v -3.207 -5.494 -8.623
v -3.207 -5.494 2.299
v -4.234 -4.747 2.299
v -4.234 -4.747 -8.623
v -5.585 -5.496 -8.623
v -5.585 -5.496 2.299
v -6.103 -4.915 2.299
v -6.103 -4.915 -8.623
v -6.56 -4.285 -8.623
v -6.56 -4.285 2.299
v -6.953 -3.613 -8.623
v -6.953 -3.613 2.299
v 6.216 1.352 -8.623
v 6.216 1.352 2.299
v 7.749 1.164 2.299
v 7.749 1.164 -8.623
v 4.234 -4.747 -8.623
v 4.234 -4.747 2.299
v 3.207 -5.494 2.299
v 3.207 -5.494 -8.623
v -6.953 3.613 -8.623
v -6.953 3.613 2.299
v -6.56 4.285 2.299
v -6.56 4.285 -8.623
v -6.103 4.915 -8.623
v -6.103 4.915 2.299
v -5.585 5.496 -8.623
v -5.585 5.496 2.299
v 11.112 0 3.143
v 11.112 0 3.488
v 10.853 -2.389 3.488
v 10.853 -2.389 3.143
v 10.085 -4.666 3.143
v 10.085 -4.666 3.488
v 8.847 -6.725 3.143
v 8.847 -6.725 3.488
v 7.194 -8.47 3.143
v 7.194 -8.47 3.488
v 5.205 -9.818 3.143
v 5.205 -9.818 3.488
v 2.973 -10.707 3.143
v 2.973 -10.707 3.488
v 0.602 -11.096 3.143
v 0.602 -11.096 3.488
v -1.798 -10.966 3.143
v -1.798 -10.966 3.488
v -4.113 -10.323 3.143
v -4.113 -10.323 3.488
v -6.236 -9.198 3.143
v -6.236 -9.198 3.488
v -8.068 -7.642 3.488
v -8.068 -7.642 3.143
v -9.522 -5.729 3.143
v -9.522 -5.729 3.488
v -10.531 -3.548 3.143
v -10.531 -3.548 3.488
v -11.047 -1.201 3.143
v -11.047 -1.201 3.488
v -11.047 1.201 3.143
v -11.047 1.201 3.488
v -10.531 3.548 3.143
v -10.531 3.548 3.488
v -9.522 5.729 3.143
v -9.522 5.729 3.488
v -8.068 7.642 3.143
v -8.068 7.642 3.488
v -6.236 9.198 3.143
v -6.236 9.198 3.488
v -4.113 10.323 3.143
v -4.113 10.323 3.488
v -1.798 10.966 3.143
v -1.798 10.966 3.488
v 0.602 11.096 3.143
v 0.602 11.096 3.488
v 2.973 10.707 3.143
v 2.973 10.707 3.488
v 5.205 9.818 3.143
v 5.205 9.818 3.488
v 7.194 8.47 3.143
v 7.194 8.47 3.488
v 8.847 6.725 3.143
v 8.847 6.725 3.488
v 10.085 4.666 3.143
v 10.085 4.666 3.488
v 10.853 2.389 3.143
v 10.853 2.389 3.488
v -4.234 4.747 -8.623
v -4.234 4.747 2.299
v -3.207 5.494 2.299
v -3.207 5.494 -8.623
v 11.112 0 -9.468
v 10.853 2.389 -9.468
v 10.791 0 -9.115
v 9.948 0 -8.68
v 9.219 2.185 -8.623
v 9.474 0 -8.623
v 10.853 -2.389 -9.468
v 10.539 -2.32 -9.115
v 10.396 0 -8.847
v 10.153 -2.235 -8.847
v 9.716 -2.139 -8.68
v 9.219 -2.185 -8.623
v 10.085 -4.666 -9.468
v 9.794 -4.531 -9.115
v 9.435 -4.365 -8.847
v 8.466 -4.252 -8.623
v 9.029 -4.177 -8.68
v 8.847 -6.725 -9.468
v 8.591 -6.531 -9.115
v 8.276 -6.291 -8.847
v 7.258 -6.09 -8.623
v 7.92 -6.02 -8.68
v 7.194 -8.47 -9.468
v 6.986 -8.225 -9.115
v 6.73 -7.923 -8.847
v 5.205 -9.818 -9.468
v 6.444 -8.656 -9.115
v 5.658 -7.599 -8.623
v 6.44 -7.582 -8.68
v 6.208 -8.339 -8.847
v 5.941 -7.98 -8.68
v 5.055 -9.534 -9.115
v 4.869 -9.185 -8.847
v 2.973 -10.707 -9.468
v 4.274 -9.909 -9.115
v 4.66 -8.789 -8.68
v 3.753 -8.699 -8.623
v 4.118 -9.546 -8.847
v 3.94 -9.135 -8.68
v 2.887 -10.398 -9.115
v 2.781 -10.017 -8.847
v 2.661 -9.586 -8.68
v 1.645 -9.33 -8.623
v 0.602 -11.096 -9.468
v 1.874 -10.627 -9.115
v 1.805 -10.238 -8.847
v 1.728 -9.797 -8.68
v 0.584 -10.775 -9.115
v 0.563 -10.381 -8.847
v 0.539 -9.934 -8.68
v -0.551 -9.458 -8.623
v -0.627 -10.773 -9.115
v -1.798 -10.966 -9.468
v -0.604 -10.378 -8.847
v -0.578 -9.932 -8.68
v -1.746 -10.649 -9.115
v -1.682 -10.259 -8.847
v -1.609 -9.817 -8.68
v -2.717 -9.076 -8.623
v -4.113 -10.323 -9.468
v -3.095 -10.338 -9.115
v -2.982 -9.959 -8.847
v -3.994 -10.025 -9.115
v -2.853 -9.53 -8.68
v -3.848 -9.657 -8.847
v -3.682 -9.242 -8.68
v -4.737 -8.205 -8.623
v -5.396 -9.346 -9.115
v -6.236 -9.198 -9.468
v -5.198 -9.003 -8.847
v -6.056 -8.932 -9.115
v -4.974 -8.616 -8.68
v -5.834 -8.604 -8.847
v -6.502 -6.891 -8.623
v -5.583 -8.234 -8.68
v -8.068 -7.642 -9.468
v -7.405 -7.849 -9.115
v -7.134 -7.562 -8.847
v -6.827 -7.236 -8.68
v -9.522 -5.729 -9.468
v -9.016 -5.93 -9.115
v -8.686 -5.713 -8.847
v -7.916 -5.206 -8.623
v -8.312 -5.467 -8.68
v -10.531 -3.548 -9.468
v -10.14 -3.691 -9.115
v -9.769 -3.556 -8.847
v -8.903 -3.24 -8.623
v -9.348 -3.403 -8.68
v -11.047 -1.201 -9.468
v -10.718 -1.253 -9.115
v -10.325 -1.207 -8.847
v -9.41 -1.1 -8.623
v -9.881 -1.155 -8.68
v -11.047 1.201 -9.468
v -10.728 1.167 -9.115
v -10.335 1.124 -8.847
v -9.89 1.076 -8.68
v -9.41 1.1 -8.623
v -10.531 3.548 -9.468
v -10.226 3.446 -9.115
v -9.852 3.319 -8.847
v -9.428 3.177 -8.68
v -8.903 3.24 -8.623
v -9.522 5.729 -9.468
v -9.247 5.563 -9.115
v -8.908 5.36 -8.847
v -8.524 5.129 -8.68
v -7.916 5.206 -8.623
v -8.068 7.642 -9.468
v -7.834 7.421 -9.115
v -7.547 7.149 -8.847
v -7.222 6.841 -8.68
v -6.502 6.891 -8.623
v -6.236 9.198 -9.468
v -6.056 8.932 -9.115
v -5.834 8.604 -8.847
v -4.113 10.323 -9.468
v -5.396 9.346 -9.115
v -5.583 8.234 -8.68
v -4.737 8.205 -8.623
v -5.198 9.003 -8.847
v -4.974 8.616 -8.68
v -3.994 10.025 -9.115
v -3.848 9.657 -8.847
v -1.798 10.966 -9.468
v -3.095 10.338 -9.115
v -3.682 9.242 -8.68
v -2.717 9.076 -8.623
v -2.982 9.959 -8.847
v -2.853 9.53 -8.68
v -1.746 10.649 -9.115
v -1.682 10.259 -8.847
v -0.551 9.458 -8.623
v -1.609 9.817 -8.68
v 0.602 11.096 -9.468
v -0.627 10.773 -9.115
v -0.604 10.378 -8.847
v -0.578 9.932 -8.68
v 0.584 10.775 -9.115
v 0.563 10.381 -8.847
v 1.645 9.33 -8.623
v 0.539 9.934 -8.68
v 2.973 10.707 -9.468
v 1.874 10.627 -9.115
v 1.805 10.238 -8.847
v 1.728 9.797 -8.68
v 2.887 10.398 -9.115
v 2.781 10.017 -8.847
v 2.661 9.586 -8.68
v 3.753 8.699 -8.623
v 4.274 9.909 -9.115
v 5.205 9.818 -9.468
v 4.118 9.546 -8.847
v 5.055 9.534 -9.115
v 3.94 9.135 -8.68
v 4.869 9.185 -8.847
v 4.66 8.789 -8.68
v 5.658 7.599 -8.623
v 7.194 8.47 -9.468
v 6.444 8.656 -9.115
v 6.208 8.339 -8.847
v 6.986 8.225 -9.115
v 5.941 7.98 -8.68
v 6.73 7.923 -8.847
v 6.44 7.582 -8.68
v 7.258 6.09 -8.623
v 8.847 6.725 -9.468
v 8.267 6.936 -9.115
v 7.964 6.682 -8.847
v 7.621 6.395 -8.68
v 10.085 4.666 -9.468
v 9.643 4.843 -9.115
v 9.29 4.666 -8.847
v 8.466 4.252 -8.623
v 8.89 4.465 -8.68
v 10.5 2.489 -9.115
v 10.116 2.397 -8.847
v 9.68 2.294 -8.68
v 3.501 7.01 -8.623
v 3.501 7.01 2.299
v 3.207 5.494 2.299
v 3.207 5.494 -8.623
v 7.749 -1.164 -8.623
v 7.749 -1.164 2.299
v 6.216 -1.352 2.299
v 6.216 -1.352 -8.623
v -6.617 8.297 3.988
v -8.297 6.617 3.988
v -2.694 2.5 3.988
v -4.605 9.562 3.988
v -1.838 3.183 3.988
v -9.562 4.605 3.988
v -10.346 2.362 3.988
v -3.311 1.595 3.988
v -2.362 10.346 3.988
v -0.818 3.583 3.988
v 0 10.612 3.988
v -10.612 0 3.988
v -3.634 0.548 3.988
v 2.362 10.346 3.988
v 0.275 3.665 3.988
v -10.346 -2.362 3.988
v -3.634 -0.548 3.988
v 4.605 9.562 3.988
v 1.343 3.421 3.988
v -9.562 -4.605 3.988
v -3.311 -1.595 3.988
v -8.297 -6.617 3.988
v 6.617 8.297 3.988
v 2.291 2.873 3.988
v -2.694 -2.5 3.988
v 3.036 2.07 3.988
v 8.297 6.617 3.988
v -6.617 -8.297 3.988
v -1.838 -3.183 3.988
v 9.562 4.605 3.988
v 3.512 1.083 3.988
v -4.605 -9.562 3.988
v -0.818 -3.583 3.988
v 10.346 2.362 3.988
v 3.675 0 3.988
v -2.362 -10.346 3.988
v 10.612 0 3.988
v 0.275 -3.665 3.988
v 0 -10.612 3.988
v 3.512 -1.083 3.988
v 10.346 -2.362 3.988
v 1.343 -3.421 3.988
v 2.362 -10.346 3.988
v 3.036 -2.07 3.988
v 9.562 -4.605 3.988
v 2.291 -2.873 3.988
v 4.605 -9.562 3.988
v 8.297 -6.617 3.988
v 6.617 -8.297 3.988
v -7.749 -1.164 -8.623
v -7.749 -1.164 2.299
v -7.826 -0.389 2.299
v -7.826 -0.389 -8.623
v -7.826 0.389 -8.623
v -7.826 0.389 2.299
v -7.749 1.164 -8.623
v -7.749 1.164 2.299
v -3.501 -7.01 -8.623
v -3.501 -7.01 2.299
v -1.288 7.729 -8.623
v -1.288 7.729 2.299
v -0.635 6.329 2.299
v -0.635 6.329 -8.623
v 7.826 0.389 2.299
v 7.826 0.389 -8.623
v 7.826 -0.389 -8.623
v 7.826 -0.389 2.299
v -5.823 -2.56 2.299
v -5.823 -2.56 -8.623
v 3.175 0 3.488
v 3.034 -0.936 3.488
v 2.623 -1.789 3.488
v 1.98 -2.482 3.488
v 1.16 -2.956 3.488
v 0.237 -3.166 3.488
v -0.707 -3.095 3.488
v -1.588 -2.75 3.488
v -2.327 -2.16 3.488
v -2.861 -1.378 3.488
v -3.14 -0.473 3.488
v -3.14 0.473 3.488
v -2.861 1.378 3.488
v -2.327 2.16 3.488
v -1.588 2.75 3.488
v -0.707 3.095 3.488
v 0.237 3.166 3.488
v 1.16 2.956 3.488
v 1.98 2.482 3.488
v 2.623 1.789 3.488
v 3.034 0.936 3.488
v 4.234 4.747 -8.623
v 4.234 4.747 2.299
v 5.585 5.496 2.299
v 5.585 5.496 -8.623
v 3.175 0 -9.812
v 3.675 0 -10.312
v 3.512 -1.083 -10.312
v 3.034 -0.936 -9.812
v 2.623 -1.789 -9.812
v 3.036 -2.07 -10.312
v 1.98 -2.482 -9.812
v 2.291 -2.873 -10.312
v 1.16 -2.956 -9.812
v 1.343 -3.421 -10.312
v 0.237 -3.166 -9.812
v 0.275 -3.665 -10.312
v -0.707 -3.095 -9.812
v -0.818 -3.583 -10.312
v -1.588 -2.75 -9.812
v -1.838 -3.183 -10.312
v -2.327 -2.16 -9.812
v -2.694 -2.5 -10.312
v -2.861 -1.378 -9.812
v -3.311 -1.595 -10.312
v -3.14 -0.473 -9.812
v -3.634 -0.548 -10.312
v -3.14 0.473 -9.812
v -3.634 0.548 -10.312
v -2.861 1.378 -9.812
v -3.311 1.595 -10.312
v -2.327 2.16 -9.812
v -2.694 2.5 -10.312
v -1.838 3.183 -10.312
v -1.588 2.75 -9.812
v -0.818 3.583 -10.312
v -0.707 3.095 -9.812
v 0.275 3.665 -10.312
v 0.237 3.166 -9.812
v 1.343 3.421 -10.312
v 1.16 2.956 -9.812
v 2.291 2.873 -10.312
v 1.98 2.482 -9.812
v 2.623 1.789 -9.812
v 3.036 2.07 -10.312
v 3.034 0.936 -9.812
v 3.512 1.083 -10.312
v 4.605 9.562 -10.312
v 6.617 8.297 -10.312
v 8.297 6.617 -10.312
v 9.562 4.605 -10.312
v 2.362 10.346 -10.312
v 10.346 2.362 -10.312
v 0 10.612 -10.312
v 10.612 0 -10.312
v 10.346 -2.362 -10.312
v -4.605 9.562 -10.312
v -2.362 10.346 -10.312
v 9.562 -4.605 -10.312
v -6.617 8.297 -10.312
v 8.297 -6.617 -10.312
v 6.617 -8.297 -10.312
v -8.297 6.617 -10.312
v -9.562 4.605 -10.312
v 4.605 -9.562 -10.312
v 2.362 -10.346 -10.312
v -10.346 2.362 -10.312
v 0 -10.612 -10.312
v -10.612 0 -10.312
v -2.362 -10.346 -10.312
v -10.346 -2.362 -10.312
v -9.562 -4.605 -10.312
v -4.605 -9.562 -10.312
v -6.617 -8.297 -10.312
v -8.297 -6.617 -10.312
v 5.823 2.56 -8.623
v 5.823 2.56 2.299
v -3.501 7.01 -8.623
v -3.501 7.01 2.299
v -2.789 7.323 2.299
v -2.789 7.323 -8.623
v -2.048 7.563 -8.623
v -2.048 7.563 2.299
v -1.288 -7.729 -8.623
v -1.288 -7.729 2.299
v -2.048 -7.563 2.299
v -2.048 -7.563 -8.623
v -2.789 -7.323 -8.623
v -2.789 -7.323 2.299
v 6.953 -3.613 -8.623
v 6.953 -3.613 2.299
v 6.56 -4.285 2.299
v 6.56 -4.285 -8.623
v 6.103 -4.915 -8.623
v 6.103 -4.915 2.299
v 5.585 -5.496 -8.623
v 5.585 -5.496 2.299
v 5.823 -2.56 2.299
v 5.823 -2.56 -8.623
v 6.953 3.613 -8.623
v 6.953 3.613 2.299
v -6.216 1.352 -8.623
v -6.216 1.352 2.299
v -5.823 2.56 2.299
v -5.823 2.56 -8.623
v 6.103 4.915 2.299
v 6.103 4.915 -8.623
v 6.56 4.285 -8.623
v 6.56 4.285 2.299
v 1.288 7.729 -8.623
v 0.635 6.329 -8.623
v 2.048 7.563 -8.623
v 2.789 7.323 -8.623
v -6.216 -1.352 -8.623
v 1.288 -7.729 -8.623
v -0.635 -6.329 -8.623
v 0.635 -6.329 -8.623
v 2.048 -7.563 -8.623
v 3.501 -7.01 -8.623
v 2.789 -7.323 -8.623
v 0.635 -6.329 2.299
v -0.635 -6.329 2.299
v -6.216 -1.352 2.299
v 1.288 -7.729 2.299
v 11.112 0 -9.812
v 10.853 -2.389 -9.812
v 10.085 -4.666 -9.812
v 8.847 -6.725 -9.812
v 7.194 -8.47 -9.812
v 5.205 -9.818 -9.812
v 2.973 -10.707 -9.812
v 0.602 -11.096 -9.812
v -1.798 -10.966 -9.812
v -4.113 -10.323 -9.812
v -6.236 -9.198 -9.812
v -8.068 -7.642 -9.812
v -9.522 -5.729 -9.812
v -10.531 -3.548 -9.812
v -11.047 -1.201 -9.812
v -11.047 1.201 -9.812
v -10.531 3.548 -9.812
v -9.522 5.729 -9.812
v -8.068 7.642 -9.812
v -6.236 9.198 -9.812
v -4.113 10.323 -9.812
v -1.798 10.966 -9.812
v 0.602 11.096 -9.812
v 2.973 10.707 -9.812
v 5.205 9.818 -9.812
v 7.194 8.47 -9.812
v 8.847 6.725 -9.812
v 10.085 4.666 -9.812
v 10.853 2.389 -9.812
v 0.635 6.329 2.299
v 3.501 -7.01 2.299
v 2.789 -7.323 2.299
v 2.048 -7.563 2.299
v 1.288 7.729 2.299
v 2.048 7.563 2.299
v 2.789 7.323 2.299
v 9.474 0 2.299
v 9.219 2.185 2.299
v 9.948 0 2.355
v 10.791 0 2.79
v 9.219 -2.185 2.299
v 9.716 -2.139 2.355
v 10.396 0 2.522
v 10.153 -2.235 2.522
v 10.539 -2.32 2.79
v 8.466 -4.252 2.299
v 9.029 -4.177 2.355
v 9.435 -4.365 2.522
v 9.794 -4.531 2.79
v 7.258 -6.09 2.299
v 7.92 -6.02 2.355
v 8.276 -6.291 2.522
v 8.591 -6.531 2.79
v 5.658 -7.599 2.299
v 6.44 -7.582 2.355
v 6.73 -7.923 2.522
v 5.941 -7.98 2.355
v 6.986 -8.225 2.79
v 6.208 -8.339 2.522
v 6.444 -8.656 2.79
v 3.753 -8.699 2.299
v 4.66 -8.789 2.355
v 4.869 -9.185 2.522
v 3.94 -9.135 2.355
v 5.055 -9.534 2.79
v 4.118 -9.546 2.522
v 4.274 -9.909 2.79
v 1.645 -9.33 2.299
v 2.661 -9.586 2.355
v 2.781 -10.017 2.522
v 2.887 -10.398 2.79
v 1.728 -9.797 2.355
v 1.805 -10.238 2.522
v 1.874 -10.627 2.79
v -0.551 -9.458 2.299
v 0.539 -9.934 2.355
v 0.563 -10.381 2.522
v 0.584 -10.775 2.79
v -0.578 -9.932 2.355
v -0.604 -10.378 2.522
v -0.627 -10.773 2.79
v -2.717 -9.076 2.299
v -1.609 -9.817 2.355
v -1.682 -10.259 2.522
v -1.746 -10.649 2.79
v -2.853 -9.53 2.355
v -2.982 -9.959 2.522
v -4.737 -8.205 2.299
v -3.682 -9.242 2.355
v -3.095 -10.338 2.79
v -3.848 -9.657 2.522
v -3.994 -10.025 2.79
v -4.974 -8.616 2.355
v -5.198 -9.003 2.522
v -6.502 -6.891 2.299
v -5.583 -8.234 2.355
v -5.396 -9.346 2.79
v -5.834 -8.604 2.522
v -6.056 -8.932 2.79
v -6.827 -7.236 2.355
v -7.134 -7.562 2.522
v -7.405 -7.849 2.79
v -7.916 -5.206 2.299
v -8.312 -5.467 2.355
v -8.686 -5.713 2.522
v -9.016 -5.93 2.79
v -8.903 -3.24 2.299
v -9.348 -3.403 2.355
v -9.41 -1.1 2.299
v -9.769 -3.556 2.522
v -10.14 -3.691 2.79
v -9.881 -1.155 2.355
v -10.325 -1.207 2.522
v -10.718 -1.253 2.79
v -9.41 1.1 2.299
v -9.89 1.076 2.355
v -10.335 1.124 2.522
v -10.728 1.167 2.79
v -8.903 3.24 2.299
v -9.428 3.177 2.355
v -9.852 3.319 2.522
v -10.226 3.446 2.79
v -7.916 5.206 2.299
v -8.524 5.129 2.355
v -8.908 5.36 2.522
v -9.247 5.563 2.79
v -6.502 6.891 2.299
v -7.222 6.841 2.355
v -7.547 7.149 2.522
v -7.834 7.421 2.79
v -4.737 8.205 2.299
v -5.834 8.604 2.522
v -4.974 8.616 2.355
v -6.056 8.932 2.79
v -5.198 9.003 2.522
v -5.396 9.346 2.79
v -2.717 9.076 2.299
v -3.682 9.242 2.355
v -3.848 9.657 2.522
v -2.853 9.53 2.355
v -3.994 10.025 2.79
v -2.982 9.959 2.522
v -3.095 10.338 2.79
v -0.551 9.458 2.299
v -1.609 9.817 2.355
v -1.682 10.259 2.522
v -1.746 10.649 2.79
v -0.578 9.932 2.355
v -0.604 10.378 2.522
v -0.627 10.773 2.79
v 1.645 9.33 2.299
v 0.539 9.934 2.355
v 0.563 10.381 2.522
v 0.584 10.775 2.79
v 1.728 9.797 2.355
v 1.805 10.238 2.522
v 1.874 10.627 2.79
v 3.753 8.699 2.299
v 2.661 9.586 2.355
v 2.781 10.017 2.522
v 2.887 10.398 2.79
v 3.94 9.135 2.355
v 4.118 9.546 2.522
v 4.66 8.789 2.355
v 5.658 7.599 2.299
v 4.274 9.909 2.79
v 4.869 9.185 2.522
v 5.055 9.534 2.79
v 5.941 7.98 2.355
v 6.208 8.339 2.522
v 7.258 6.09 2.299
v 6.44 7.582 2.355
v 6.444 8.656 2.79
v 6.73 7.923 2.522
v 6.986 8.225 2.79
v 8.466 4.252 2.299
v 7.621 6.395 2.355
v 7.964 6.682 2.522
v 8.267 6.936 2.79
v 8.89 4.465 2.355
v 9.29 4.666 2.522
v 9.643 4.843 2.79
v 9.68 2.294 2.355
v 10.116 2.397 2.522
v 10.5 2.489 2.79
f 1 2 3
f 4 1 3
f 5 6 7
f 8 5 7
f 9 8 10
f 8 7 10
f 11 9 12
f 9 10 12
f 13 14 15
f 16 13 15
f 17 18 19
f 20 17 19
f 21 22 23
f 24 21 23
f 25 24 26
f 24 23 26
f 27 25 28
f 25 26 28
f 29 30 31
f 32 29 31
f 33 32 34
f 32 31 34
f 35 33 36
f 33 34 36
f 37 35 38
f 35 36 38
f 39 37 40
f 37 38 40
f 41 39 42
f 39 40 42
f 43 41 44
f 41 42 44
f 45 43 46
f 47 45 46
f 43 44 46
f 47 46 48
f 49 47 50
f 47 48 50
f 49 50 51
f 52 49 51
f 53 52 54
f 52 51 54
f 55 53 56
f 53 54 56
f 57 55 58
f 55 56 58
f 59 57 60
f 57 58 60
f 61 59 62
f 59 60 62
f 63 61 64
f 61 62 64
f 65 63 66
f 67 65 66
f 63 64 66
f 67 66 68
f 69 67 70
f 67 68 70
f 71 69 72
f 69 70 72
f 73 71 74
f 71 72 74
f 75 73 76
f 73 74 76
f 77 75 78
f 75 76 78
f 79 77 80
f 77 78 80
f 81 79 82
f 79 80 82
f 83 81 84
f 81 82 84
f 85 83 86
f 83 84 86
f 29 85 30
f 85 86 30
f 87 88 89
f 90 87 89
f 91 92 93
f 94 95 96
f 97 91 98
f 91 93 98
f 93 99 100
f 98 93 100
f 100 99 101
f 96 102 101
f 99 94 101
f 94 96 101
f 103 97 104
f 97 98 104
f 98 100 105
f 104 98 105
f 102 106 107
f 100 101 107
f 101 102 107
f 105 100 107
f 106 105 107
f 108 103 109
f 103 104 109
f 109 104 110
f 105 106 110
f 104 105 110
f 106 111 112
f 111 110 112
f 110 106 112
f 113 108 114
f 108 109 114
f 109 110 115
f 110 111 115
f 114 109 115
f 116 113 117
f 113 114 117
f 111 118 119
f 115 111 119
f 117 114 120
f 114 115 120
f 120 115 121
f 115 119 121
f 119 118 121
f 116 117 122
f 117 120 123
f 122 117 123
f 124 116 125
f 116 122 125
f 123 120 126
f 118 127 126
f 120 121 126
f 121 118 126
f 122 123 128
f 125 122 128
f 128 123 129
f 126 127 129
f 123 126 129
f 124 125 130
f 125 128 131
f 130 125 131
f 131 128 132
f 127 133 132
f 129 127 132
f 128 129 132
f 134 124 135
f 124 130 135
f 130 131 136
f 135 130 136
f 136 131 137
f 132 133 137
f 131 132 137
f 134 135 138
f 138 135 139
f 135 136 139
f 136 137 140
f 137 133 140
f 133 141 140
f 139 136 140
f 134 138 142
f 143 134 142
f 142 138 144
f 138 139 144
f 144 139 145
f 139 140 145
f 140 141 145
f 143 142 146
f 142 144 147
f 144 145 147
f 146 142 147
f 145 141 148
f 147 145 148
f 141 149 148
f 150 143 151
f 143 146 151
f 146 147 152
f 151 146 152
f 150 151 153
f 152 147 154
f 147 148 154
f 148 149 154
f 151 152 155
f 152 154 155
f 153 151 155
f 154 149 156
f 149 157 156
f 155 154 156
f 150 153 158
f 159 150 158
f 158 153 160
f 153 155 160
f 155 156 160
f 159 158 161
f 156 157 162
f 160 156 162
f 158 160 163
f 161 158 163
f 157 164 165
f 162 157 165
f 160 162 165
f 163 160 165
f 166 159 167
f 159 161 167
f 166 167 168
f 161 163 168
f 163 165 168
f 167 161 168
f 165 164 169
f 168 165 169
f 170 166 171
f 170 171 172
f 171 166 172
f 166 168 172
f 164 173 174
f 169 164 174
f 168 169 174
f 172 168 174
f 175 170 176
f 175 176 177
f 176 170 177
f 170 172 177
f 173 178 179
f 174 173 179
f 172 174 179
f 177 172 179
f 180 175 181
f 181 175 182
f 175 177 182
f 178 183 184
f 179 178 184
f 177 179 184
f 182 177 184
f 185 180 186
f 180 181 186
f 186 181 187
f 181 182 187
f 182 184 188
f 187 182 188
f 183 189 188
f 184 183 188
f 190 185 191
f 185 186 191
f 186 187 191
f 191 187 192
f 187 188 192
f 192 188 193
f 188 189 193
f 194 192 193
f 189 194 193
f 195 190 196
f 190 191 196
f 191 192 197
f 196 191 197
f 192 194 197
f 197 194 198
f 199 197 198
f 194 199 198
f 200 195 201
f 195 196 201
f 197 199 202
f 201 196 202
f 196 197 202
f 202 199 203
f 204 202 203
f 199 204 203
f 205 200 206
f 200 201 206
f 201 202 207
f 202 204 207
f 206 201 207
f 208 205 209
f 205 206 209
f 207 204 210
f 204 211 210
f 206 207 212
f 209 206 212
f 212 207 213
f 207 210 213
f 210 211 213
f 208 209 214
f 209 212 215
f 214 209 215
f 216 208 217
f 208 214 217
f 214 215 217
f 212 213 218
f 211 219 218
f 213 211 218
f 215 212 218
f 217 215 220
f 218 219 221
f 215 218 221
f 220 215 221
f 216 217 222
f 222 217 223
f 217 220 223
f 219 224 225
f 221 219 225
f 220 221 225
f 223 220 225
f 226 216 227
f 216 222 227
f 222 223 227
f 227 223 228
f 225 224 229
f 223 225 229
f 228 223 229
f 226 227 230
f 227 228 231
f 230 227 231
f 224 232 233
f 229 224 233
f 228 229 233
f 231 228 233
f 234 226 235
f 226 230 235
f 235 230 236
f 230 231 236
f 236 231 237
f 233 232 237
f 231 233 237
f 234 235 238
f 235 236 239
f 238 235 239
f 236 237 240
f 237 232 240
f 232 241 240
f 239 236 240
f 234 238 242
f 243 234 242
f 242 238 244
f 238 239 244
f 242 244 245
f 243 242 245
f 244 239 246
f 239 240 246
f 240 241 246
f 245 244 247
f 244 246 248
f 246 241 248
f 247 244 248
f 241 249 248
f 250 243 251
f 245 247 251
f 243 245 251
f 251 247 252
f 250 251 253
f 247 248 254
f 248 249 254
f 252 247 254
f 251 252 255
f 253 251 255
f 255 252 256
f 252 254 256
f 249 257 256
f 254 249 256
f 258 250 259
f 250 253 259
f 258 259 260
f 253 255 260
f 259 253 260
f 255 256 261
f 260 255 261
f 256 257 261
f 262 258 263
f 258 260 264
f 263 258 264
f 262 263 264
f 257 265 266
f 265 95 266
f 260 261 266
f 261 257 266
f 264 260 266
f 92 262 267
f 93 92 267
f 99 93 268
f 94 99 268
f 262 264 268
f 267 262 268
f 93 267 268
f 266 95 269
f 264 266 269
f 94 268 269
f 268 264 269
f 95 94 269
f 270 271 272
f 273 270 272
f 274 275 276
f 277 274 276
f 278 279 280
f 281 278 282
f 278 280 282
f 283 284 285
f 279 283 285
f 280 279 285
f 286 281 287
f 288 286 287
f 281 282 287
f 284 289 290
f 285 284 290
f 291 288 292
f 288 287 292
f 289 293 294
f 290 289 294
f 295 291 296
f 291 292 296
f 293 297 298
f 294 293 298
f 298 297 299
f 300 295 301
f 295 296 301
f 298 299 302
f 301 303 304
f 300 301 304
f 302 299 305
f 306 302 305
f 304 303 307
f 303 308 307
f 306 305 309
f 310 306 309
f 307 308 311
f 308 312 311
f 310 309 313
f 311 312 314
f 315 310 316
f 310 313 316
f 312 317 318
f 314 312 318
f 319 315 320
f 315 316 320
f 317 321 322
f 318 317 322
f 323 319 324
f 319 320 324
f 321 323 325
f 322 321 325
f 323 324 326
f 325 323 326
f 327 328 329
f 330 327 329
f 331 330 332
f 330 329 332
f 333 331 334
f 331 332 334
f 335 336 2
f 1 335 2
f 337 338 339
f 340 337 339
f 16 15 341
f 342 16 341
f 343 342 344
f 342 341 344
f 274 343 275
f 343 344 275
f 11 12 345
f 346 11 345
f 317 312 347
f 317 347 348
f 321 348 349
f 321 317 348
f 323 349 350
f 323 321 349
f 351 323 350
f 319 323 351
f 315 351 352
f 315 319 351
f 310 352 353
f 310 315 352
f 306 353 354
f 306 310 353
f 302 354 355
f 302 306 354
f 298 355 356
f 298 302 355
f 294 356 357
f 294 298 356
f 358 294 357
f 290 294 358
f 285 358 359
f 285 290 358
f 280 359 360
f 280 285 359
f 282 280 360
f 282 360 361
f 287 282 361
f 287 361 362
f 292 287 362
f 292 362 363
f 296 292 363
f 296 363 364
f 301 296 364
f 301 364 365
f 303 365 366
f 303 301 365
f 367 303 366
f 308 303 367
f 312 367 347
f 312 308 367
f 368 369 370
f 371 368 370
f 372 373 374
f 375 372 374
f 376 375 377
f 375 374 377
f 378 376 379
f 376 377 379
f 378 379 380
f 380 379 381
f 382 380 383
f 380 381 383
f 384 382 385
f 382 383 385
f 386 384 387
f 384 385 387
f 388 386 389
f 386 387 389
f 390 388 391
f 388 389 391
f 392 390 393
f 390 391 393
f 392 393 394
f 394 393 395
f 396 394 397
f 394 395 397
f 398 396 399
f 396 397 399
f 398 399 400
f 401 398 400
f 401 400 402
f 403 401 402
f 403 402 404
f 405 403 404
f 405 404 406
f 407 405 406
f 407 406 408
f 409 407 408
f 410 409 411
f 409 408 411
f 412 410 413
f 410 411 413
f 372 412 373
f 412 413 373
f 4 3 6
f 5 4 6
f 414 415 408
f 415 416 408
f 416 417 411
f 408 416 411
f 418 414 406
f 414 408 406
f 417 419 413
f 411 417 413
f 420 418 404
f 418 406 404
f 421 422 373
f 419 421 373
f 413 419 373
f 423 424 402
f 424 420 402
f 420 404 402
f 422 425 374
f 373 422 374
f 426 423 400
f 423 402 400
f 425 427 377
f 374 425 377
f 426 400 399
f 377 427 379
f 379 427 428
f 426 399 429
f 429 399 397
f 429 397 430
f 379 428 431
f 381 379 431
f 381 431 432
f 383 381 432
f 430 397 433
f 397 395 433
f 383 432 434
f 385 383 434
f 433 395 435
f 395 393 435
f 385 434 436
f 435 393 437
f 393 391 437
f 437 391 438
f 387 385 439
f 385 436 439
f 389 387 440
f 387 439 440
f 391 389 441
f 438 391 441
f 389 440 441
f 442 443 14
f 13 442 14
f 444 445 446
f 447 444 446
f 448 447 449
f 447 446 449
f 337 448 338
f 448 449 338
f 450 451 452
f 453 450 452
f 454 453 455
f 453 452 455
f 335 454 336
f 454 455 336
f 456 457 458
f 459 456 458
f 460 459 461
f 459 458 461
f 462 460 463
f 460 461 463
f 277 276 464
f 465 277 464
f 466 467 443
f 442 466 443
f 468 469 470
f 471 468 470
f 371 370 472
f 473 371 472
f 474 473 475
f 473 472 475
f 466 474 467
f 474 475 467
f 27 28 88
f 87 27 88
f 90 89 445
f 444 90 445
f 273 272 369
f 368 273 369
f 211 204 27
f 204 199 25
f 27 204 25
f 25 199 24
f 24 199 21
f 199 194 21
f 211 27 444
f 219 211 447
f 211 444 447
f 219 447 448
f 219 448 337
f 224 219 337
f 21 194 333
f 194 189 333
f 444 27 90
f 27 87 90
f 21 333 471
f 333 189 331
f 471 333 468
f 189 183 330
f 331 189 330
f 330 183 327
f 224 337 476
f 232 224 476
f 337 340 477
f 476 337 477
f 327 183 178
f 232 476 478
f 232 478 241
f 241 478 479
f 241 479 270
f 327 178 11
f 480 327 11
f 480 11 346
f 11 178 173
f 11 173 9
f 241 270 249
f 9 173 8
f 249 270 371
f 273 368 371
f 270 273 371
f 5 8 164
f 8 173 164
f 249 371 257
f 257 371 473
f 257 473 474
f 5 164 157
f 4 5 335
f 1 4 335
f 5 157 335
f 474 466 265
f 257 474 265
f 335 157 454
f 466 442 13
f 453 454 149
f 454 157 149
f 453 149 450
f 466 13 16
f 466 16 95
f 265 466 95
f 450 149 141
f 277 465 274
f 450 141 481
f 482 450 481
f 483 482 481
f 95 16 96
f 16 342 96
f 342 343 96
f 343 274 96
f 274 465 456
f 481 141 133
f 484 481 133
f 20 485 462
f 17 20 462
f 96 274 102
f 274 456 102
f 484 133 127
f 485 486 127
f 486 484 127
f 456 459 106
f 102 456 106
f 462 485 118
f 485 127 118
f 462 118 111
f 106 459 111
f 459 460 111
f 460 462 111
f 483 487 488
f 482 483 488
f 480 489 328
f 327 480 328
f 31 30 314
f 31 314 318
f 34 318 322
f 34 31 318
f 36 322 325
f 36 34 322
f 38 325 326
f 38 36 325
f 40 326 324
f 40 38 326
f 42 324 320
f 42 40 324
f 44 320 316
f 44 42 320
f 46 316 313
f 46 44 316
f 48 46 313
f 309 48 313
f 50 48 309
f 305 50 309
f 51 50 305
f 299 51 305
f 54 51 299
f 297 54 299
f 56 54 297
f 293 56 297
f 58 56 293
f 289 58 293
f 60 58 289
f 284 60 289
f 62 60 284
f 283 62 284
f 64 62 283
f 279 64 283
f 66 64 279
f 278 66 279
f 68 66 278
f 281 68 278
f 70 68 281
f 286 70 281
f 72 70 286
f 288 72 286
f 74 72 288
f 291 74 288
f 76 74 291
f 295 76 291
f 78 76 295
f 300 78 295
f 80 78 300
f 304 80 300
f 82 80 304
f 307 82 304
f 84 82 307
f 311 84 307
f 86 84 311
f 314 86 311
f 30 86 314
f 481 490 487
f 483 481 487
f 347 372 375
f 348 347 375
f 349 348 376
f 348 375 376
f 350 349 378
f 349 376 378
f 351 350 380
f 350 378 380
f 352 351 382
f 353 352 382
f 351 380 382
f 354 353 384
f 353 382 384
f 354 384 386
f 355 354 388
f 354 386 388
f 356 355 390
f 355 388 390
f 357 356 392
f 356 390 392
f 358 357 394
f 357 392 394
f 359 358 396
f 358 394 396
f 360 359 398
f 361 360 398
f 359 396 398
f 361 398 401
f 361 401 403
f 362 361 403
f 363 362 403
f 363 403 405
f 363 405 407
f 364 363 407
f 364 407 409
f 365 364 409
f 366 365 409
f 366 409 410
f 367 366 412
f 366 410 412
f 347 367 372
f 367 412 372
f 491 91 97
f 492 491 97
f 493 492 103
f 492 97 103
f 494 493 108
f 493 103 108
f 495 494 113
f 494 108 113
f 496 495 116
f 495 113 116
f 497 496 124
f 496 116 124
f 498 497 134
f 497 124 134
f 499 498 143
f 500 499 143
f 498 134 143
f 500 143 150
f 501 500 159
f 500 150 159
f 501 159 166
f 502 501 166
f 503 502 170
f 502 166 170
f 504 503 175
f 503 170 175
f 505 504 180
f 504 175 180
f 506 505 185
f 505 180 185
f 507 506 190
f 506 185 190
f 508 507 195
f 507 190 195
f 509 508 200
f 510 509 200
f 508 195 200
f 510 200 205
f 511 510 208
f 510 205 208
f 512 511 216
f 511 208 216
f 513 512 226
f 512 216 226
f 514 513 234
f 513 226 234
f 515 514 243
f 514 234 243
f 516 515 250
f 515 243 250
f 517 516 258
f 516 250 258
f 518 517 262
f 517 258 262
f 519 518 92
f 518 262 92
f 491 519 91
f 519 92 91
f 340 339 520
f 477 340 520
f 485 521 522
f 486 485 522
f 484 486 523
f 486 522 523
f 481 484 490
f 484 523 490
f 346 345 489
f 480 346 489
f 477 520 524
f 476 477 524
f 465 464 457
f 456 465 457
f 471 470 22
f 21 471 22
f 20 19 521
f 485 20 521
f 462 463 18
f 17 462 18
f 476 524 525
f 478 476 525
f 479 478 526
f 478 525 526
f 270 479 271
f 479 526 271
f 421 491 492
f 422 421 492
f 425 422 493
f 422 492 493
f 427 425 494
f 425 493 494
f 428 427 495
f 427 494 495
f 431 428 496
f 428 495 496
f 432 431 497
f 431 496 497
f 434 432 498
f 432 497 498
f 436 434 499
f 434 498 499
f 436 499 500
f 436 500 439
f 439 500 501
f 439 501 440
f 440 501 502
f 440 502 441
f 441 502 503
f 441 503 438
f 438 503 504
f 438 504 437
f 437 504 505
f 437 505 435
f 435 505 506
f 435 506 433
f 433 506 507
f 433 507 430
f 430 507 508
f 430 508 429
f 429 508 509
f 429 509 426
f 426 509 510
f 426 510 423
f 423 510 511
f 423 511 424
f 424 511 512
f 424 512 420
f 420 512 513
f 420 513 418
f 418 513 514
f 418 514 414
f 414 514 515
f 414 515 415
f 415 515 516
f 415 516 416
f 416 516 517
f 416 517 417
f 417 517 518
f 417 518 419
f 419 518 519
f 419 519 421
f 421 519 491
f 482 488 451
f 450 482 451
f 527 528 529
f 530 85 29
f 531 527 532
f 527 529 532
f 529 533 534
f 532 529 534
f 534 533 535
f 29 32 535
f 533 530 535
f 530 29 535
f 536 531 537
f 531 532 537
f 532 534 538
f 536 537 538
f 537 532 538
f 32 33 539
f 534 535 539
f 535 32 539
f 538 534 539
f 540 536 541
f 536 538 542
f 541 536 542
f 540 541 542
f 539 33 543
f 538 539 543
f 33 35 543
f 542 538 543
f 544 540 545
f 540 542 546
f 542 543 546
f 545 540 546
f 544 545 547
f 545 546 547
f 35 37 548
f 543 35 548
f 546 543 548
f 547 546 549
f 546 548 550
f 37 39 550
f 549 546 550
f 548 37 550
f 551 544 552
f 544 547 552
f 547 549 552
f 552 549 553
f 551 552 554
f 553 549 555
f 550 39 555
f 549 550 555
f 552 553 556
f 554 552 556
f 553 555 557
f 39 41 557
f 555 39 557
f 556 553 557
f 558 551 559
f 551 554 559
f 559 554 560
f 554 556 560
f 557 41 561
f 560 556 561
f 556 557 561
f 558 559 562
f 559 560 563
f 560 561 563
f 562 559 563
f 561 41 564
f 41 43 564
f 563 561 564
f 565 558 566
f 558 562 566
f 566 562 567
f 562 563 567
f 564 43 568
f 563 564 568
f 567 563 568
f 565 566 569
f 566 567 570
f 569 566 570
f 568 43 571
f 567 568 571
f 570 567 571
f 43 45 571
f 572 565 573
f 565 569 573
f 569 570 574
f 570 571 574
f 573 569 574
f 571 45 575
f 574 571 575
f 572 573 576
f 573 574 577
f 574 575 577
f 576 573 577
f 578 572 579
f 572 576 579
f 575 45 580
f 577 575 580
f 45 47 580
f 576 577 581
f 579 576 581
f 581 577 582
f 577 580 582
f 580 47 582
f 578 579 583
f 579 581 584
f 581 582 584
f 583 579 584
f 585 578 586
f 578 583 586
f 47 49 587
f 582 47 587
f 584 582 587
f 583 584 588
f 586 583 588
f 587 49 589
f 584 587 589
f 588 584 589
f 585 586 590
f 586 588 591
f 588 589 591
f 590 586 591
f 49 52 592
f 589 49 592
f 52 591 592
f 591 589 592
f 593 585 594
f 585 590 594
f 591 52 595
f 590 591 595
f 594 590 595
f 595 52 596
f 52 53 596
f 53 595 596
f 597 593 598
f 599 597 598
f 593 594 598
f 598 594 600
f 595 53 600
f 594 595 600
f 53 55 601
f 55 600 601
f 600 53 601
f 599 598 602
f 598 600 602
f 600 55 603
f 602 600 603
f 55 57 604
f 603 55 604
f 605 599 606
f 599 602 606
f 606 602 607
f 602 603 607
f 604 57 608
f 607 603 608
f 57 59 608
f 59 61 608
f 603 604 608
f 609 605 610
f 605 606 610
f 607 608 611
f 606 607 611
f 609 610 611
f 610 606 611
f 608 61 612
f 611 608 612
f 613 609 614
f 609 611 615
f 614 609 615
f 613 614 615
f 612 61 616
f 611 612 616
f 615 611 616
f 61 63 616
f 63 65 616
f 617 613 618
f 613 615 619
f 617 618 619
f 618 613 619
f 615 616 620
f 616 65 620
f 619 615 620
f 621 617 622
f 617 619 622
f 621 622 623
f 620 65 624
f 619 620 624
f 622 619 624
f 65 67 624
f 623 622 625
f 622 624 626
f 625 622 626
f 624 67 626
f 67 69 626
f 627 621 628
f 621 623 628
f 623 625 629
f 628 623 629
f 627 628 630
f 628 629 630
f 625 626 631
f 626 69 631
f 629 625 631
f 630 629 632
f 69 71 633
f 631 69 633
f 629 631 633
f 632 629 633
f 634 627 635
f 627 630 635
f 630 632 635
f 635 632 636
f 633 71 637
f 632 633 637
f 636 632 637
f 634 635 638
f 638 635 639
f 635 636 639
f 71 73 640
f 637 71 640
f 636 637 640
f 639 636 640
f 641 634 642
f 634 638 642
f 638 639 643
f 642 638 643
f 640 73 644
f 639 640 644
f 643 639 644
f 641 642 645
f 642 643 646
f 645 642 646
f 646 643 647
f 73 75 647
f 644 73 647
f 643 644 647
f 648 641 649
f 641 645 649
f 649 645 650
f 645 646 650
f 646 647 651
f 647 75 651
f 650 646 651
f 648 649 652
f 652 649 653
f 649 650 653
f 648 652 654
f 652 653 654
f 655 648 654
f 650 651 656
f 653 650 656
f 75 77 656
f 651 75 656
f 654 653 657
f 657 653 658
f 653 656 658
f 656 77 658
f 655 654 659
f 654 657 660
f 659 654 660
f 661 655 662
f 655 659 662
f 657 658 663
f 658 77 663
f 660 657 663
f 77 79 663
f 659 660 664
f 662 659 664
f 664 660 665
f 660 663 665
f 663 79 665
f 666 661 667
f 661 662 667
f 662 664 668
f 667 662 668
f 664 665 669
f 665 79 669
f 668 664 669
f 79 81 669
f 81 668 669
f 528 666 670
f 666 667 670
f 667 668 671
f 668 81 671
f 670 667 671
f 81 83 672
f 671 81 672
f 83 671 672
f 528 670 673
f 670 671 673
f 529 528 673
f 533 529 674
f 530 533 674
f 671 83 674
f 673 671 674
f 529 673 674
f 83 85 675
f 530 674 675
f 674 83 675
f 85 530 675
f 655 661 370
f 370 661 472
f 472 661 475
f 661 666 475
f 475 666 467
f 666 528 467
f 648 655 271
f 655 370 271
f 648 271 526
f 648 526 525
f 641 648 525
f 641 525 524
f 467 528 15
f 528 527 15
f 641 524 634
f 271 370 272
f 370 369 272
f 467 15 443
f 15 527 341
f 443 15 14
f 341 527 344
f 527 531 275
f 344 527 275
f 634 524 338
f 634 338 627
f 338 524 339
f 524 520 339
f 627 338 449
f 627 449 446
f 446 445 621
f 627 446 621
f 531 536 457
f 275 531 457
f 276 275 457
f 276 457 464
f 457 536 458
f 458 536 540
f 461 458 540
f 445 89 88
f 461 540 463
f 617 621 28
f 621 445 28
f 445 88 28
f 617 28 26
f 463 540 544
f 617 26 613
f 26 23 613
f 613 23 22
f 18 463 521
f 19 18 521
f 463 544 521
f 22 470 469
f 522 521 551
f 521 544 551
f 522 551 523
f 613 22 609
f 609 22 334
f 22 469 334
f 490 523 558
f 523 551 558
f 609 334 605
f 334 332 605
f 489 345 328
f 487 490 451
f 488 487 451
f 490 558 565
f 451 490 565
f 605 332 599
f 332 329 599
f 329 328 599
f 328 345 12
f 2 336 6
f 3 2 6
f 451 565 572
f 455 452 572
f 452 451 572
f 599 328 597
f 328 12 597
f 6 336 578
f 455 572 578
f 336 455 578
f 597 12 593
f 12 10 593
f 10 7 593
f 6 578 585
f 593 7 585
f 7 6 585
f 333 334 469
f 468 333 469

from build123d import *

# Parameters (mm, degrees)
CUT_EXTRUDE1_START = 2.2987
CUT_EXTRUDE1_DEPTH = 10.922
CIRPATTERN1_COUNT  = 10
CHAMFER1_SIZE      = 0.5


with BuildPart() as part:
    # Sketch2 → Revolve1 (revolve)
    with BuildSketch(Plane(origin=(0, 0, 0), x_dir=(0, 0, -1), z_dir=(1, 0, 0)), mode=Mode.PRIVATE) as revolve1_sk:
        with BuildLine():
            Line((-3.9878, 3.175), (10.3124, 3.175))
            Line((10.3124, 3.175), (10.3124, 11.1125))
            Line((10.3124, 11.1125), (9.46785, 11.1125))
            ThreePointArc((9.46785, 11.1125), (8.846862309, 10.395787163), (8.6233, 9.4742))
            Line((8.6233, 9.4742), (8.6233, 7.8359))
            Line((8.6233, 7.8359), (-2.2987, 7.8359))
            Line((-2.2987, 7.8359), (-2.2987, 9.4742))
            ThreePointArc((-2.2987, 9.4742), (-2.522262309, 10.395787163), (-3.14325, 11.1125))
            Line((-3.14325, 11.1125), (-3.9878, 11.1125))
            Line((-3.9878, 11.1125), (-3.9878, 3.175))
        make_face()
    revolve(revolve1_sk.sketch.rotate(Axis((0, 0, 10.3124), (0, 0, -1)), 90), axis=Axis((0, 0, 10.3124), (0, 0, -1)))

    # Sketch3 → Cut-Extrude1 (cut)
    with BuildSketch(Plane.XY.offset(CUT_EXTRUDE1_START)):
        with BuildLine():
            Line((-0.635, 6.329348022), (0.635, 6.329348022))
            Line((0.635, 6.329348022), (1.287830721, 7.729348022))
            ThreePointArc((1.287830721, 7.729348022), (0, 7.8359), (-1.287830721, 7.729348022))
            Line((-1.287830721, 7.729348022), (-0.635, 6.329348022))
        make_face()
    cut_extrude1 = extrude(amount=-CUT_EXTRUDE1_DEPTH, mode=Mode.SUBTRACT)

    # CirPattern1: Cut-Extrude1 ×10 about axis
    cirpattern1_axis = Axis((0, 0, 0), (0, 0, 1))
    for i in range(1, CIRPATTERN1_COUNT):
        add(cut_extrude1.rotate(cirpattern1_axis, i * 360 / CIRPATTERN1_COUNT), mode=Mode.SUBTRACT)

    # Chamfer1
    chamfer1_edges = [part.edges().sort_by_distance(p)[0] for p in [
        (-11.1125, 0, -10.3124),
        (-3.175, 0, -10.3124),
        (-3.175, 0, 3.9878),
        (-11.1125, 0, 3.9878),
    ]]
    chamfer(chamfer1_edges, length=CHAMFER1_SIZE)


solid = part.part
